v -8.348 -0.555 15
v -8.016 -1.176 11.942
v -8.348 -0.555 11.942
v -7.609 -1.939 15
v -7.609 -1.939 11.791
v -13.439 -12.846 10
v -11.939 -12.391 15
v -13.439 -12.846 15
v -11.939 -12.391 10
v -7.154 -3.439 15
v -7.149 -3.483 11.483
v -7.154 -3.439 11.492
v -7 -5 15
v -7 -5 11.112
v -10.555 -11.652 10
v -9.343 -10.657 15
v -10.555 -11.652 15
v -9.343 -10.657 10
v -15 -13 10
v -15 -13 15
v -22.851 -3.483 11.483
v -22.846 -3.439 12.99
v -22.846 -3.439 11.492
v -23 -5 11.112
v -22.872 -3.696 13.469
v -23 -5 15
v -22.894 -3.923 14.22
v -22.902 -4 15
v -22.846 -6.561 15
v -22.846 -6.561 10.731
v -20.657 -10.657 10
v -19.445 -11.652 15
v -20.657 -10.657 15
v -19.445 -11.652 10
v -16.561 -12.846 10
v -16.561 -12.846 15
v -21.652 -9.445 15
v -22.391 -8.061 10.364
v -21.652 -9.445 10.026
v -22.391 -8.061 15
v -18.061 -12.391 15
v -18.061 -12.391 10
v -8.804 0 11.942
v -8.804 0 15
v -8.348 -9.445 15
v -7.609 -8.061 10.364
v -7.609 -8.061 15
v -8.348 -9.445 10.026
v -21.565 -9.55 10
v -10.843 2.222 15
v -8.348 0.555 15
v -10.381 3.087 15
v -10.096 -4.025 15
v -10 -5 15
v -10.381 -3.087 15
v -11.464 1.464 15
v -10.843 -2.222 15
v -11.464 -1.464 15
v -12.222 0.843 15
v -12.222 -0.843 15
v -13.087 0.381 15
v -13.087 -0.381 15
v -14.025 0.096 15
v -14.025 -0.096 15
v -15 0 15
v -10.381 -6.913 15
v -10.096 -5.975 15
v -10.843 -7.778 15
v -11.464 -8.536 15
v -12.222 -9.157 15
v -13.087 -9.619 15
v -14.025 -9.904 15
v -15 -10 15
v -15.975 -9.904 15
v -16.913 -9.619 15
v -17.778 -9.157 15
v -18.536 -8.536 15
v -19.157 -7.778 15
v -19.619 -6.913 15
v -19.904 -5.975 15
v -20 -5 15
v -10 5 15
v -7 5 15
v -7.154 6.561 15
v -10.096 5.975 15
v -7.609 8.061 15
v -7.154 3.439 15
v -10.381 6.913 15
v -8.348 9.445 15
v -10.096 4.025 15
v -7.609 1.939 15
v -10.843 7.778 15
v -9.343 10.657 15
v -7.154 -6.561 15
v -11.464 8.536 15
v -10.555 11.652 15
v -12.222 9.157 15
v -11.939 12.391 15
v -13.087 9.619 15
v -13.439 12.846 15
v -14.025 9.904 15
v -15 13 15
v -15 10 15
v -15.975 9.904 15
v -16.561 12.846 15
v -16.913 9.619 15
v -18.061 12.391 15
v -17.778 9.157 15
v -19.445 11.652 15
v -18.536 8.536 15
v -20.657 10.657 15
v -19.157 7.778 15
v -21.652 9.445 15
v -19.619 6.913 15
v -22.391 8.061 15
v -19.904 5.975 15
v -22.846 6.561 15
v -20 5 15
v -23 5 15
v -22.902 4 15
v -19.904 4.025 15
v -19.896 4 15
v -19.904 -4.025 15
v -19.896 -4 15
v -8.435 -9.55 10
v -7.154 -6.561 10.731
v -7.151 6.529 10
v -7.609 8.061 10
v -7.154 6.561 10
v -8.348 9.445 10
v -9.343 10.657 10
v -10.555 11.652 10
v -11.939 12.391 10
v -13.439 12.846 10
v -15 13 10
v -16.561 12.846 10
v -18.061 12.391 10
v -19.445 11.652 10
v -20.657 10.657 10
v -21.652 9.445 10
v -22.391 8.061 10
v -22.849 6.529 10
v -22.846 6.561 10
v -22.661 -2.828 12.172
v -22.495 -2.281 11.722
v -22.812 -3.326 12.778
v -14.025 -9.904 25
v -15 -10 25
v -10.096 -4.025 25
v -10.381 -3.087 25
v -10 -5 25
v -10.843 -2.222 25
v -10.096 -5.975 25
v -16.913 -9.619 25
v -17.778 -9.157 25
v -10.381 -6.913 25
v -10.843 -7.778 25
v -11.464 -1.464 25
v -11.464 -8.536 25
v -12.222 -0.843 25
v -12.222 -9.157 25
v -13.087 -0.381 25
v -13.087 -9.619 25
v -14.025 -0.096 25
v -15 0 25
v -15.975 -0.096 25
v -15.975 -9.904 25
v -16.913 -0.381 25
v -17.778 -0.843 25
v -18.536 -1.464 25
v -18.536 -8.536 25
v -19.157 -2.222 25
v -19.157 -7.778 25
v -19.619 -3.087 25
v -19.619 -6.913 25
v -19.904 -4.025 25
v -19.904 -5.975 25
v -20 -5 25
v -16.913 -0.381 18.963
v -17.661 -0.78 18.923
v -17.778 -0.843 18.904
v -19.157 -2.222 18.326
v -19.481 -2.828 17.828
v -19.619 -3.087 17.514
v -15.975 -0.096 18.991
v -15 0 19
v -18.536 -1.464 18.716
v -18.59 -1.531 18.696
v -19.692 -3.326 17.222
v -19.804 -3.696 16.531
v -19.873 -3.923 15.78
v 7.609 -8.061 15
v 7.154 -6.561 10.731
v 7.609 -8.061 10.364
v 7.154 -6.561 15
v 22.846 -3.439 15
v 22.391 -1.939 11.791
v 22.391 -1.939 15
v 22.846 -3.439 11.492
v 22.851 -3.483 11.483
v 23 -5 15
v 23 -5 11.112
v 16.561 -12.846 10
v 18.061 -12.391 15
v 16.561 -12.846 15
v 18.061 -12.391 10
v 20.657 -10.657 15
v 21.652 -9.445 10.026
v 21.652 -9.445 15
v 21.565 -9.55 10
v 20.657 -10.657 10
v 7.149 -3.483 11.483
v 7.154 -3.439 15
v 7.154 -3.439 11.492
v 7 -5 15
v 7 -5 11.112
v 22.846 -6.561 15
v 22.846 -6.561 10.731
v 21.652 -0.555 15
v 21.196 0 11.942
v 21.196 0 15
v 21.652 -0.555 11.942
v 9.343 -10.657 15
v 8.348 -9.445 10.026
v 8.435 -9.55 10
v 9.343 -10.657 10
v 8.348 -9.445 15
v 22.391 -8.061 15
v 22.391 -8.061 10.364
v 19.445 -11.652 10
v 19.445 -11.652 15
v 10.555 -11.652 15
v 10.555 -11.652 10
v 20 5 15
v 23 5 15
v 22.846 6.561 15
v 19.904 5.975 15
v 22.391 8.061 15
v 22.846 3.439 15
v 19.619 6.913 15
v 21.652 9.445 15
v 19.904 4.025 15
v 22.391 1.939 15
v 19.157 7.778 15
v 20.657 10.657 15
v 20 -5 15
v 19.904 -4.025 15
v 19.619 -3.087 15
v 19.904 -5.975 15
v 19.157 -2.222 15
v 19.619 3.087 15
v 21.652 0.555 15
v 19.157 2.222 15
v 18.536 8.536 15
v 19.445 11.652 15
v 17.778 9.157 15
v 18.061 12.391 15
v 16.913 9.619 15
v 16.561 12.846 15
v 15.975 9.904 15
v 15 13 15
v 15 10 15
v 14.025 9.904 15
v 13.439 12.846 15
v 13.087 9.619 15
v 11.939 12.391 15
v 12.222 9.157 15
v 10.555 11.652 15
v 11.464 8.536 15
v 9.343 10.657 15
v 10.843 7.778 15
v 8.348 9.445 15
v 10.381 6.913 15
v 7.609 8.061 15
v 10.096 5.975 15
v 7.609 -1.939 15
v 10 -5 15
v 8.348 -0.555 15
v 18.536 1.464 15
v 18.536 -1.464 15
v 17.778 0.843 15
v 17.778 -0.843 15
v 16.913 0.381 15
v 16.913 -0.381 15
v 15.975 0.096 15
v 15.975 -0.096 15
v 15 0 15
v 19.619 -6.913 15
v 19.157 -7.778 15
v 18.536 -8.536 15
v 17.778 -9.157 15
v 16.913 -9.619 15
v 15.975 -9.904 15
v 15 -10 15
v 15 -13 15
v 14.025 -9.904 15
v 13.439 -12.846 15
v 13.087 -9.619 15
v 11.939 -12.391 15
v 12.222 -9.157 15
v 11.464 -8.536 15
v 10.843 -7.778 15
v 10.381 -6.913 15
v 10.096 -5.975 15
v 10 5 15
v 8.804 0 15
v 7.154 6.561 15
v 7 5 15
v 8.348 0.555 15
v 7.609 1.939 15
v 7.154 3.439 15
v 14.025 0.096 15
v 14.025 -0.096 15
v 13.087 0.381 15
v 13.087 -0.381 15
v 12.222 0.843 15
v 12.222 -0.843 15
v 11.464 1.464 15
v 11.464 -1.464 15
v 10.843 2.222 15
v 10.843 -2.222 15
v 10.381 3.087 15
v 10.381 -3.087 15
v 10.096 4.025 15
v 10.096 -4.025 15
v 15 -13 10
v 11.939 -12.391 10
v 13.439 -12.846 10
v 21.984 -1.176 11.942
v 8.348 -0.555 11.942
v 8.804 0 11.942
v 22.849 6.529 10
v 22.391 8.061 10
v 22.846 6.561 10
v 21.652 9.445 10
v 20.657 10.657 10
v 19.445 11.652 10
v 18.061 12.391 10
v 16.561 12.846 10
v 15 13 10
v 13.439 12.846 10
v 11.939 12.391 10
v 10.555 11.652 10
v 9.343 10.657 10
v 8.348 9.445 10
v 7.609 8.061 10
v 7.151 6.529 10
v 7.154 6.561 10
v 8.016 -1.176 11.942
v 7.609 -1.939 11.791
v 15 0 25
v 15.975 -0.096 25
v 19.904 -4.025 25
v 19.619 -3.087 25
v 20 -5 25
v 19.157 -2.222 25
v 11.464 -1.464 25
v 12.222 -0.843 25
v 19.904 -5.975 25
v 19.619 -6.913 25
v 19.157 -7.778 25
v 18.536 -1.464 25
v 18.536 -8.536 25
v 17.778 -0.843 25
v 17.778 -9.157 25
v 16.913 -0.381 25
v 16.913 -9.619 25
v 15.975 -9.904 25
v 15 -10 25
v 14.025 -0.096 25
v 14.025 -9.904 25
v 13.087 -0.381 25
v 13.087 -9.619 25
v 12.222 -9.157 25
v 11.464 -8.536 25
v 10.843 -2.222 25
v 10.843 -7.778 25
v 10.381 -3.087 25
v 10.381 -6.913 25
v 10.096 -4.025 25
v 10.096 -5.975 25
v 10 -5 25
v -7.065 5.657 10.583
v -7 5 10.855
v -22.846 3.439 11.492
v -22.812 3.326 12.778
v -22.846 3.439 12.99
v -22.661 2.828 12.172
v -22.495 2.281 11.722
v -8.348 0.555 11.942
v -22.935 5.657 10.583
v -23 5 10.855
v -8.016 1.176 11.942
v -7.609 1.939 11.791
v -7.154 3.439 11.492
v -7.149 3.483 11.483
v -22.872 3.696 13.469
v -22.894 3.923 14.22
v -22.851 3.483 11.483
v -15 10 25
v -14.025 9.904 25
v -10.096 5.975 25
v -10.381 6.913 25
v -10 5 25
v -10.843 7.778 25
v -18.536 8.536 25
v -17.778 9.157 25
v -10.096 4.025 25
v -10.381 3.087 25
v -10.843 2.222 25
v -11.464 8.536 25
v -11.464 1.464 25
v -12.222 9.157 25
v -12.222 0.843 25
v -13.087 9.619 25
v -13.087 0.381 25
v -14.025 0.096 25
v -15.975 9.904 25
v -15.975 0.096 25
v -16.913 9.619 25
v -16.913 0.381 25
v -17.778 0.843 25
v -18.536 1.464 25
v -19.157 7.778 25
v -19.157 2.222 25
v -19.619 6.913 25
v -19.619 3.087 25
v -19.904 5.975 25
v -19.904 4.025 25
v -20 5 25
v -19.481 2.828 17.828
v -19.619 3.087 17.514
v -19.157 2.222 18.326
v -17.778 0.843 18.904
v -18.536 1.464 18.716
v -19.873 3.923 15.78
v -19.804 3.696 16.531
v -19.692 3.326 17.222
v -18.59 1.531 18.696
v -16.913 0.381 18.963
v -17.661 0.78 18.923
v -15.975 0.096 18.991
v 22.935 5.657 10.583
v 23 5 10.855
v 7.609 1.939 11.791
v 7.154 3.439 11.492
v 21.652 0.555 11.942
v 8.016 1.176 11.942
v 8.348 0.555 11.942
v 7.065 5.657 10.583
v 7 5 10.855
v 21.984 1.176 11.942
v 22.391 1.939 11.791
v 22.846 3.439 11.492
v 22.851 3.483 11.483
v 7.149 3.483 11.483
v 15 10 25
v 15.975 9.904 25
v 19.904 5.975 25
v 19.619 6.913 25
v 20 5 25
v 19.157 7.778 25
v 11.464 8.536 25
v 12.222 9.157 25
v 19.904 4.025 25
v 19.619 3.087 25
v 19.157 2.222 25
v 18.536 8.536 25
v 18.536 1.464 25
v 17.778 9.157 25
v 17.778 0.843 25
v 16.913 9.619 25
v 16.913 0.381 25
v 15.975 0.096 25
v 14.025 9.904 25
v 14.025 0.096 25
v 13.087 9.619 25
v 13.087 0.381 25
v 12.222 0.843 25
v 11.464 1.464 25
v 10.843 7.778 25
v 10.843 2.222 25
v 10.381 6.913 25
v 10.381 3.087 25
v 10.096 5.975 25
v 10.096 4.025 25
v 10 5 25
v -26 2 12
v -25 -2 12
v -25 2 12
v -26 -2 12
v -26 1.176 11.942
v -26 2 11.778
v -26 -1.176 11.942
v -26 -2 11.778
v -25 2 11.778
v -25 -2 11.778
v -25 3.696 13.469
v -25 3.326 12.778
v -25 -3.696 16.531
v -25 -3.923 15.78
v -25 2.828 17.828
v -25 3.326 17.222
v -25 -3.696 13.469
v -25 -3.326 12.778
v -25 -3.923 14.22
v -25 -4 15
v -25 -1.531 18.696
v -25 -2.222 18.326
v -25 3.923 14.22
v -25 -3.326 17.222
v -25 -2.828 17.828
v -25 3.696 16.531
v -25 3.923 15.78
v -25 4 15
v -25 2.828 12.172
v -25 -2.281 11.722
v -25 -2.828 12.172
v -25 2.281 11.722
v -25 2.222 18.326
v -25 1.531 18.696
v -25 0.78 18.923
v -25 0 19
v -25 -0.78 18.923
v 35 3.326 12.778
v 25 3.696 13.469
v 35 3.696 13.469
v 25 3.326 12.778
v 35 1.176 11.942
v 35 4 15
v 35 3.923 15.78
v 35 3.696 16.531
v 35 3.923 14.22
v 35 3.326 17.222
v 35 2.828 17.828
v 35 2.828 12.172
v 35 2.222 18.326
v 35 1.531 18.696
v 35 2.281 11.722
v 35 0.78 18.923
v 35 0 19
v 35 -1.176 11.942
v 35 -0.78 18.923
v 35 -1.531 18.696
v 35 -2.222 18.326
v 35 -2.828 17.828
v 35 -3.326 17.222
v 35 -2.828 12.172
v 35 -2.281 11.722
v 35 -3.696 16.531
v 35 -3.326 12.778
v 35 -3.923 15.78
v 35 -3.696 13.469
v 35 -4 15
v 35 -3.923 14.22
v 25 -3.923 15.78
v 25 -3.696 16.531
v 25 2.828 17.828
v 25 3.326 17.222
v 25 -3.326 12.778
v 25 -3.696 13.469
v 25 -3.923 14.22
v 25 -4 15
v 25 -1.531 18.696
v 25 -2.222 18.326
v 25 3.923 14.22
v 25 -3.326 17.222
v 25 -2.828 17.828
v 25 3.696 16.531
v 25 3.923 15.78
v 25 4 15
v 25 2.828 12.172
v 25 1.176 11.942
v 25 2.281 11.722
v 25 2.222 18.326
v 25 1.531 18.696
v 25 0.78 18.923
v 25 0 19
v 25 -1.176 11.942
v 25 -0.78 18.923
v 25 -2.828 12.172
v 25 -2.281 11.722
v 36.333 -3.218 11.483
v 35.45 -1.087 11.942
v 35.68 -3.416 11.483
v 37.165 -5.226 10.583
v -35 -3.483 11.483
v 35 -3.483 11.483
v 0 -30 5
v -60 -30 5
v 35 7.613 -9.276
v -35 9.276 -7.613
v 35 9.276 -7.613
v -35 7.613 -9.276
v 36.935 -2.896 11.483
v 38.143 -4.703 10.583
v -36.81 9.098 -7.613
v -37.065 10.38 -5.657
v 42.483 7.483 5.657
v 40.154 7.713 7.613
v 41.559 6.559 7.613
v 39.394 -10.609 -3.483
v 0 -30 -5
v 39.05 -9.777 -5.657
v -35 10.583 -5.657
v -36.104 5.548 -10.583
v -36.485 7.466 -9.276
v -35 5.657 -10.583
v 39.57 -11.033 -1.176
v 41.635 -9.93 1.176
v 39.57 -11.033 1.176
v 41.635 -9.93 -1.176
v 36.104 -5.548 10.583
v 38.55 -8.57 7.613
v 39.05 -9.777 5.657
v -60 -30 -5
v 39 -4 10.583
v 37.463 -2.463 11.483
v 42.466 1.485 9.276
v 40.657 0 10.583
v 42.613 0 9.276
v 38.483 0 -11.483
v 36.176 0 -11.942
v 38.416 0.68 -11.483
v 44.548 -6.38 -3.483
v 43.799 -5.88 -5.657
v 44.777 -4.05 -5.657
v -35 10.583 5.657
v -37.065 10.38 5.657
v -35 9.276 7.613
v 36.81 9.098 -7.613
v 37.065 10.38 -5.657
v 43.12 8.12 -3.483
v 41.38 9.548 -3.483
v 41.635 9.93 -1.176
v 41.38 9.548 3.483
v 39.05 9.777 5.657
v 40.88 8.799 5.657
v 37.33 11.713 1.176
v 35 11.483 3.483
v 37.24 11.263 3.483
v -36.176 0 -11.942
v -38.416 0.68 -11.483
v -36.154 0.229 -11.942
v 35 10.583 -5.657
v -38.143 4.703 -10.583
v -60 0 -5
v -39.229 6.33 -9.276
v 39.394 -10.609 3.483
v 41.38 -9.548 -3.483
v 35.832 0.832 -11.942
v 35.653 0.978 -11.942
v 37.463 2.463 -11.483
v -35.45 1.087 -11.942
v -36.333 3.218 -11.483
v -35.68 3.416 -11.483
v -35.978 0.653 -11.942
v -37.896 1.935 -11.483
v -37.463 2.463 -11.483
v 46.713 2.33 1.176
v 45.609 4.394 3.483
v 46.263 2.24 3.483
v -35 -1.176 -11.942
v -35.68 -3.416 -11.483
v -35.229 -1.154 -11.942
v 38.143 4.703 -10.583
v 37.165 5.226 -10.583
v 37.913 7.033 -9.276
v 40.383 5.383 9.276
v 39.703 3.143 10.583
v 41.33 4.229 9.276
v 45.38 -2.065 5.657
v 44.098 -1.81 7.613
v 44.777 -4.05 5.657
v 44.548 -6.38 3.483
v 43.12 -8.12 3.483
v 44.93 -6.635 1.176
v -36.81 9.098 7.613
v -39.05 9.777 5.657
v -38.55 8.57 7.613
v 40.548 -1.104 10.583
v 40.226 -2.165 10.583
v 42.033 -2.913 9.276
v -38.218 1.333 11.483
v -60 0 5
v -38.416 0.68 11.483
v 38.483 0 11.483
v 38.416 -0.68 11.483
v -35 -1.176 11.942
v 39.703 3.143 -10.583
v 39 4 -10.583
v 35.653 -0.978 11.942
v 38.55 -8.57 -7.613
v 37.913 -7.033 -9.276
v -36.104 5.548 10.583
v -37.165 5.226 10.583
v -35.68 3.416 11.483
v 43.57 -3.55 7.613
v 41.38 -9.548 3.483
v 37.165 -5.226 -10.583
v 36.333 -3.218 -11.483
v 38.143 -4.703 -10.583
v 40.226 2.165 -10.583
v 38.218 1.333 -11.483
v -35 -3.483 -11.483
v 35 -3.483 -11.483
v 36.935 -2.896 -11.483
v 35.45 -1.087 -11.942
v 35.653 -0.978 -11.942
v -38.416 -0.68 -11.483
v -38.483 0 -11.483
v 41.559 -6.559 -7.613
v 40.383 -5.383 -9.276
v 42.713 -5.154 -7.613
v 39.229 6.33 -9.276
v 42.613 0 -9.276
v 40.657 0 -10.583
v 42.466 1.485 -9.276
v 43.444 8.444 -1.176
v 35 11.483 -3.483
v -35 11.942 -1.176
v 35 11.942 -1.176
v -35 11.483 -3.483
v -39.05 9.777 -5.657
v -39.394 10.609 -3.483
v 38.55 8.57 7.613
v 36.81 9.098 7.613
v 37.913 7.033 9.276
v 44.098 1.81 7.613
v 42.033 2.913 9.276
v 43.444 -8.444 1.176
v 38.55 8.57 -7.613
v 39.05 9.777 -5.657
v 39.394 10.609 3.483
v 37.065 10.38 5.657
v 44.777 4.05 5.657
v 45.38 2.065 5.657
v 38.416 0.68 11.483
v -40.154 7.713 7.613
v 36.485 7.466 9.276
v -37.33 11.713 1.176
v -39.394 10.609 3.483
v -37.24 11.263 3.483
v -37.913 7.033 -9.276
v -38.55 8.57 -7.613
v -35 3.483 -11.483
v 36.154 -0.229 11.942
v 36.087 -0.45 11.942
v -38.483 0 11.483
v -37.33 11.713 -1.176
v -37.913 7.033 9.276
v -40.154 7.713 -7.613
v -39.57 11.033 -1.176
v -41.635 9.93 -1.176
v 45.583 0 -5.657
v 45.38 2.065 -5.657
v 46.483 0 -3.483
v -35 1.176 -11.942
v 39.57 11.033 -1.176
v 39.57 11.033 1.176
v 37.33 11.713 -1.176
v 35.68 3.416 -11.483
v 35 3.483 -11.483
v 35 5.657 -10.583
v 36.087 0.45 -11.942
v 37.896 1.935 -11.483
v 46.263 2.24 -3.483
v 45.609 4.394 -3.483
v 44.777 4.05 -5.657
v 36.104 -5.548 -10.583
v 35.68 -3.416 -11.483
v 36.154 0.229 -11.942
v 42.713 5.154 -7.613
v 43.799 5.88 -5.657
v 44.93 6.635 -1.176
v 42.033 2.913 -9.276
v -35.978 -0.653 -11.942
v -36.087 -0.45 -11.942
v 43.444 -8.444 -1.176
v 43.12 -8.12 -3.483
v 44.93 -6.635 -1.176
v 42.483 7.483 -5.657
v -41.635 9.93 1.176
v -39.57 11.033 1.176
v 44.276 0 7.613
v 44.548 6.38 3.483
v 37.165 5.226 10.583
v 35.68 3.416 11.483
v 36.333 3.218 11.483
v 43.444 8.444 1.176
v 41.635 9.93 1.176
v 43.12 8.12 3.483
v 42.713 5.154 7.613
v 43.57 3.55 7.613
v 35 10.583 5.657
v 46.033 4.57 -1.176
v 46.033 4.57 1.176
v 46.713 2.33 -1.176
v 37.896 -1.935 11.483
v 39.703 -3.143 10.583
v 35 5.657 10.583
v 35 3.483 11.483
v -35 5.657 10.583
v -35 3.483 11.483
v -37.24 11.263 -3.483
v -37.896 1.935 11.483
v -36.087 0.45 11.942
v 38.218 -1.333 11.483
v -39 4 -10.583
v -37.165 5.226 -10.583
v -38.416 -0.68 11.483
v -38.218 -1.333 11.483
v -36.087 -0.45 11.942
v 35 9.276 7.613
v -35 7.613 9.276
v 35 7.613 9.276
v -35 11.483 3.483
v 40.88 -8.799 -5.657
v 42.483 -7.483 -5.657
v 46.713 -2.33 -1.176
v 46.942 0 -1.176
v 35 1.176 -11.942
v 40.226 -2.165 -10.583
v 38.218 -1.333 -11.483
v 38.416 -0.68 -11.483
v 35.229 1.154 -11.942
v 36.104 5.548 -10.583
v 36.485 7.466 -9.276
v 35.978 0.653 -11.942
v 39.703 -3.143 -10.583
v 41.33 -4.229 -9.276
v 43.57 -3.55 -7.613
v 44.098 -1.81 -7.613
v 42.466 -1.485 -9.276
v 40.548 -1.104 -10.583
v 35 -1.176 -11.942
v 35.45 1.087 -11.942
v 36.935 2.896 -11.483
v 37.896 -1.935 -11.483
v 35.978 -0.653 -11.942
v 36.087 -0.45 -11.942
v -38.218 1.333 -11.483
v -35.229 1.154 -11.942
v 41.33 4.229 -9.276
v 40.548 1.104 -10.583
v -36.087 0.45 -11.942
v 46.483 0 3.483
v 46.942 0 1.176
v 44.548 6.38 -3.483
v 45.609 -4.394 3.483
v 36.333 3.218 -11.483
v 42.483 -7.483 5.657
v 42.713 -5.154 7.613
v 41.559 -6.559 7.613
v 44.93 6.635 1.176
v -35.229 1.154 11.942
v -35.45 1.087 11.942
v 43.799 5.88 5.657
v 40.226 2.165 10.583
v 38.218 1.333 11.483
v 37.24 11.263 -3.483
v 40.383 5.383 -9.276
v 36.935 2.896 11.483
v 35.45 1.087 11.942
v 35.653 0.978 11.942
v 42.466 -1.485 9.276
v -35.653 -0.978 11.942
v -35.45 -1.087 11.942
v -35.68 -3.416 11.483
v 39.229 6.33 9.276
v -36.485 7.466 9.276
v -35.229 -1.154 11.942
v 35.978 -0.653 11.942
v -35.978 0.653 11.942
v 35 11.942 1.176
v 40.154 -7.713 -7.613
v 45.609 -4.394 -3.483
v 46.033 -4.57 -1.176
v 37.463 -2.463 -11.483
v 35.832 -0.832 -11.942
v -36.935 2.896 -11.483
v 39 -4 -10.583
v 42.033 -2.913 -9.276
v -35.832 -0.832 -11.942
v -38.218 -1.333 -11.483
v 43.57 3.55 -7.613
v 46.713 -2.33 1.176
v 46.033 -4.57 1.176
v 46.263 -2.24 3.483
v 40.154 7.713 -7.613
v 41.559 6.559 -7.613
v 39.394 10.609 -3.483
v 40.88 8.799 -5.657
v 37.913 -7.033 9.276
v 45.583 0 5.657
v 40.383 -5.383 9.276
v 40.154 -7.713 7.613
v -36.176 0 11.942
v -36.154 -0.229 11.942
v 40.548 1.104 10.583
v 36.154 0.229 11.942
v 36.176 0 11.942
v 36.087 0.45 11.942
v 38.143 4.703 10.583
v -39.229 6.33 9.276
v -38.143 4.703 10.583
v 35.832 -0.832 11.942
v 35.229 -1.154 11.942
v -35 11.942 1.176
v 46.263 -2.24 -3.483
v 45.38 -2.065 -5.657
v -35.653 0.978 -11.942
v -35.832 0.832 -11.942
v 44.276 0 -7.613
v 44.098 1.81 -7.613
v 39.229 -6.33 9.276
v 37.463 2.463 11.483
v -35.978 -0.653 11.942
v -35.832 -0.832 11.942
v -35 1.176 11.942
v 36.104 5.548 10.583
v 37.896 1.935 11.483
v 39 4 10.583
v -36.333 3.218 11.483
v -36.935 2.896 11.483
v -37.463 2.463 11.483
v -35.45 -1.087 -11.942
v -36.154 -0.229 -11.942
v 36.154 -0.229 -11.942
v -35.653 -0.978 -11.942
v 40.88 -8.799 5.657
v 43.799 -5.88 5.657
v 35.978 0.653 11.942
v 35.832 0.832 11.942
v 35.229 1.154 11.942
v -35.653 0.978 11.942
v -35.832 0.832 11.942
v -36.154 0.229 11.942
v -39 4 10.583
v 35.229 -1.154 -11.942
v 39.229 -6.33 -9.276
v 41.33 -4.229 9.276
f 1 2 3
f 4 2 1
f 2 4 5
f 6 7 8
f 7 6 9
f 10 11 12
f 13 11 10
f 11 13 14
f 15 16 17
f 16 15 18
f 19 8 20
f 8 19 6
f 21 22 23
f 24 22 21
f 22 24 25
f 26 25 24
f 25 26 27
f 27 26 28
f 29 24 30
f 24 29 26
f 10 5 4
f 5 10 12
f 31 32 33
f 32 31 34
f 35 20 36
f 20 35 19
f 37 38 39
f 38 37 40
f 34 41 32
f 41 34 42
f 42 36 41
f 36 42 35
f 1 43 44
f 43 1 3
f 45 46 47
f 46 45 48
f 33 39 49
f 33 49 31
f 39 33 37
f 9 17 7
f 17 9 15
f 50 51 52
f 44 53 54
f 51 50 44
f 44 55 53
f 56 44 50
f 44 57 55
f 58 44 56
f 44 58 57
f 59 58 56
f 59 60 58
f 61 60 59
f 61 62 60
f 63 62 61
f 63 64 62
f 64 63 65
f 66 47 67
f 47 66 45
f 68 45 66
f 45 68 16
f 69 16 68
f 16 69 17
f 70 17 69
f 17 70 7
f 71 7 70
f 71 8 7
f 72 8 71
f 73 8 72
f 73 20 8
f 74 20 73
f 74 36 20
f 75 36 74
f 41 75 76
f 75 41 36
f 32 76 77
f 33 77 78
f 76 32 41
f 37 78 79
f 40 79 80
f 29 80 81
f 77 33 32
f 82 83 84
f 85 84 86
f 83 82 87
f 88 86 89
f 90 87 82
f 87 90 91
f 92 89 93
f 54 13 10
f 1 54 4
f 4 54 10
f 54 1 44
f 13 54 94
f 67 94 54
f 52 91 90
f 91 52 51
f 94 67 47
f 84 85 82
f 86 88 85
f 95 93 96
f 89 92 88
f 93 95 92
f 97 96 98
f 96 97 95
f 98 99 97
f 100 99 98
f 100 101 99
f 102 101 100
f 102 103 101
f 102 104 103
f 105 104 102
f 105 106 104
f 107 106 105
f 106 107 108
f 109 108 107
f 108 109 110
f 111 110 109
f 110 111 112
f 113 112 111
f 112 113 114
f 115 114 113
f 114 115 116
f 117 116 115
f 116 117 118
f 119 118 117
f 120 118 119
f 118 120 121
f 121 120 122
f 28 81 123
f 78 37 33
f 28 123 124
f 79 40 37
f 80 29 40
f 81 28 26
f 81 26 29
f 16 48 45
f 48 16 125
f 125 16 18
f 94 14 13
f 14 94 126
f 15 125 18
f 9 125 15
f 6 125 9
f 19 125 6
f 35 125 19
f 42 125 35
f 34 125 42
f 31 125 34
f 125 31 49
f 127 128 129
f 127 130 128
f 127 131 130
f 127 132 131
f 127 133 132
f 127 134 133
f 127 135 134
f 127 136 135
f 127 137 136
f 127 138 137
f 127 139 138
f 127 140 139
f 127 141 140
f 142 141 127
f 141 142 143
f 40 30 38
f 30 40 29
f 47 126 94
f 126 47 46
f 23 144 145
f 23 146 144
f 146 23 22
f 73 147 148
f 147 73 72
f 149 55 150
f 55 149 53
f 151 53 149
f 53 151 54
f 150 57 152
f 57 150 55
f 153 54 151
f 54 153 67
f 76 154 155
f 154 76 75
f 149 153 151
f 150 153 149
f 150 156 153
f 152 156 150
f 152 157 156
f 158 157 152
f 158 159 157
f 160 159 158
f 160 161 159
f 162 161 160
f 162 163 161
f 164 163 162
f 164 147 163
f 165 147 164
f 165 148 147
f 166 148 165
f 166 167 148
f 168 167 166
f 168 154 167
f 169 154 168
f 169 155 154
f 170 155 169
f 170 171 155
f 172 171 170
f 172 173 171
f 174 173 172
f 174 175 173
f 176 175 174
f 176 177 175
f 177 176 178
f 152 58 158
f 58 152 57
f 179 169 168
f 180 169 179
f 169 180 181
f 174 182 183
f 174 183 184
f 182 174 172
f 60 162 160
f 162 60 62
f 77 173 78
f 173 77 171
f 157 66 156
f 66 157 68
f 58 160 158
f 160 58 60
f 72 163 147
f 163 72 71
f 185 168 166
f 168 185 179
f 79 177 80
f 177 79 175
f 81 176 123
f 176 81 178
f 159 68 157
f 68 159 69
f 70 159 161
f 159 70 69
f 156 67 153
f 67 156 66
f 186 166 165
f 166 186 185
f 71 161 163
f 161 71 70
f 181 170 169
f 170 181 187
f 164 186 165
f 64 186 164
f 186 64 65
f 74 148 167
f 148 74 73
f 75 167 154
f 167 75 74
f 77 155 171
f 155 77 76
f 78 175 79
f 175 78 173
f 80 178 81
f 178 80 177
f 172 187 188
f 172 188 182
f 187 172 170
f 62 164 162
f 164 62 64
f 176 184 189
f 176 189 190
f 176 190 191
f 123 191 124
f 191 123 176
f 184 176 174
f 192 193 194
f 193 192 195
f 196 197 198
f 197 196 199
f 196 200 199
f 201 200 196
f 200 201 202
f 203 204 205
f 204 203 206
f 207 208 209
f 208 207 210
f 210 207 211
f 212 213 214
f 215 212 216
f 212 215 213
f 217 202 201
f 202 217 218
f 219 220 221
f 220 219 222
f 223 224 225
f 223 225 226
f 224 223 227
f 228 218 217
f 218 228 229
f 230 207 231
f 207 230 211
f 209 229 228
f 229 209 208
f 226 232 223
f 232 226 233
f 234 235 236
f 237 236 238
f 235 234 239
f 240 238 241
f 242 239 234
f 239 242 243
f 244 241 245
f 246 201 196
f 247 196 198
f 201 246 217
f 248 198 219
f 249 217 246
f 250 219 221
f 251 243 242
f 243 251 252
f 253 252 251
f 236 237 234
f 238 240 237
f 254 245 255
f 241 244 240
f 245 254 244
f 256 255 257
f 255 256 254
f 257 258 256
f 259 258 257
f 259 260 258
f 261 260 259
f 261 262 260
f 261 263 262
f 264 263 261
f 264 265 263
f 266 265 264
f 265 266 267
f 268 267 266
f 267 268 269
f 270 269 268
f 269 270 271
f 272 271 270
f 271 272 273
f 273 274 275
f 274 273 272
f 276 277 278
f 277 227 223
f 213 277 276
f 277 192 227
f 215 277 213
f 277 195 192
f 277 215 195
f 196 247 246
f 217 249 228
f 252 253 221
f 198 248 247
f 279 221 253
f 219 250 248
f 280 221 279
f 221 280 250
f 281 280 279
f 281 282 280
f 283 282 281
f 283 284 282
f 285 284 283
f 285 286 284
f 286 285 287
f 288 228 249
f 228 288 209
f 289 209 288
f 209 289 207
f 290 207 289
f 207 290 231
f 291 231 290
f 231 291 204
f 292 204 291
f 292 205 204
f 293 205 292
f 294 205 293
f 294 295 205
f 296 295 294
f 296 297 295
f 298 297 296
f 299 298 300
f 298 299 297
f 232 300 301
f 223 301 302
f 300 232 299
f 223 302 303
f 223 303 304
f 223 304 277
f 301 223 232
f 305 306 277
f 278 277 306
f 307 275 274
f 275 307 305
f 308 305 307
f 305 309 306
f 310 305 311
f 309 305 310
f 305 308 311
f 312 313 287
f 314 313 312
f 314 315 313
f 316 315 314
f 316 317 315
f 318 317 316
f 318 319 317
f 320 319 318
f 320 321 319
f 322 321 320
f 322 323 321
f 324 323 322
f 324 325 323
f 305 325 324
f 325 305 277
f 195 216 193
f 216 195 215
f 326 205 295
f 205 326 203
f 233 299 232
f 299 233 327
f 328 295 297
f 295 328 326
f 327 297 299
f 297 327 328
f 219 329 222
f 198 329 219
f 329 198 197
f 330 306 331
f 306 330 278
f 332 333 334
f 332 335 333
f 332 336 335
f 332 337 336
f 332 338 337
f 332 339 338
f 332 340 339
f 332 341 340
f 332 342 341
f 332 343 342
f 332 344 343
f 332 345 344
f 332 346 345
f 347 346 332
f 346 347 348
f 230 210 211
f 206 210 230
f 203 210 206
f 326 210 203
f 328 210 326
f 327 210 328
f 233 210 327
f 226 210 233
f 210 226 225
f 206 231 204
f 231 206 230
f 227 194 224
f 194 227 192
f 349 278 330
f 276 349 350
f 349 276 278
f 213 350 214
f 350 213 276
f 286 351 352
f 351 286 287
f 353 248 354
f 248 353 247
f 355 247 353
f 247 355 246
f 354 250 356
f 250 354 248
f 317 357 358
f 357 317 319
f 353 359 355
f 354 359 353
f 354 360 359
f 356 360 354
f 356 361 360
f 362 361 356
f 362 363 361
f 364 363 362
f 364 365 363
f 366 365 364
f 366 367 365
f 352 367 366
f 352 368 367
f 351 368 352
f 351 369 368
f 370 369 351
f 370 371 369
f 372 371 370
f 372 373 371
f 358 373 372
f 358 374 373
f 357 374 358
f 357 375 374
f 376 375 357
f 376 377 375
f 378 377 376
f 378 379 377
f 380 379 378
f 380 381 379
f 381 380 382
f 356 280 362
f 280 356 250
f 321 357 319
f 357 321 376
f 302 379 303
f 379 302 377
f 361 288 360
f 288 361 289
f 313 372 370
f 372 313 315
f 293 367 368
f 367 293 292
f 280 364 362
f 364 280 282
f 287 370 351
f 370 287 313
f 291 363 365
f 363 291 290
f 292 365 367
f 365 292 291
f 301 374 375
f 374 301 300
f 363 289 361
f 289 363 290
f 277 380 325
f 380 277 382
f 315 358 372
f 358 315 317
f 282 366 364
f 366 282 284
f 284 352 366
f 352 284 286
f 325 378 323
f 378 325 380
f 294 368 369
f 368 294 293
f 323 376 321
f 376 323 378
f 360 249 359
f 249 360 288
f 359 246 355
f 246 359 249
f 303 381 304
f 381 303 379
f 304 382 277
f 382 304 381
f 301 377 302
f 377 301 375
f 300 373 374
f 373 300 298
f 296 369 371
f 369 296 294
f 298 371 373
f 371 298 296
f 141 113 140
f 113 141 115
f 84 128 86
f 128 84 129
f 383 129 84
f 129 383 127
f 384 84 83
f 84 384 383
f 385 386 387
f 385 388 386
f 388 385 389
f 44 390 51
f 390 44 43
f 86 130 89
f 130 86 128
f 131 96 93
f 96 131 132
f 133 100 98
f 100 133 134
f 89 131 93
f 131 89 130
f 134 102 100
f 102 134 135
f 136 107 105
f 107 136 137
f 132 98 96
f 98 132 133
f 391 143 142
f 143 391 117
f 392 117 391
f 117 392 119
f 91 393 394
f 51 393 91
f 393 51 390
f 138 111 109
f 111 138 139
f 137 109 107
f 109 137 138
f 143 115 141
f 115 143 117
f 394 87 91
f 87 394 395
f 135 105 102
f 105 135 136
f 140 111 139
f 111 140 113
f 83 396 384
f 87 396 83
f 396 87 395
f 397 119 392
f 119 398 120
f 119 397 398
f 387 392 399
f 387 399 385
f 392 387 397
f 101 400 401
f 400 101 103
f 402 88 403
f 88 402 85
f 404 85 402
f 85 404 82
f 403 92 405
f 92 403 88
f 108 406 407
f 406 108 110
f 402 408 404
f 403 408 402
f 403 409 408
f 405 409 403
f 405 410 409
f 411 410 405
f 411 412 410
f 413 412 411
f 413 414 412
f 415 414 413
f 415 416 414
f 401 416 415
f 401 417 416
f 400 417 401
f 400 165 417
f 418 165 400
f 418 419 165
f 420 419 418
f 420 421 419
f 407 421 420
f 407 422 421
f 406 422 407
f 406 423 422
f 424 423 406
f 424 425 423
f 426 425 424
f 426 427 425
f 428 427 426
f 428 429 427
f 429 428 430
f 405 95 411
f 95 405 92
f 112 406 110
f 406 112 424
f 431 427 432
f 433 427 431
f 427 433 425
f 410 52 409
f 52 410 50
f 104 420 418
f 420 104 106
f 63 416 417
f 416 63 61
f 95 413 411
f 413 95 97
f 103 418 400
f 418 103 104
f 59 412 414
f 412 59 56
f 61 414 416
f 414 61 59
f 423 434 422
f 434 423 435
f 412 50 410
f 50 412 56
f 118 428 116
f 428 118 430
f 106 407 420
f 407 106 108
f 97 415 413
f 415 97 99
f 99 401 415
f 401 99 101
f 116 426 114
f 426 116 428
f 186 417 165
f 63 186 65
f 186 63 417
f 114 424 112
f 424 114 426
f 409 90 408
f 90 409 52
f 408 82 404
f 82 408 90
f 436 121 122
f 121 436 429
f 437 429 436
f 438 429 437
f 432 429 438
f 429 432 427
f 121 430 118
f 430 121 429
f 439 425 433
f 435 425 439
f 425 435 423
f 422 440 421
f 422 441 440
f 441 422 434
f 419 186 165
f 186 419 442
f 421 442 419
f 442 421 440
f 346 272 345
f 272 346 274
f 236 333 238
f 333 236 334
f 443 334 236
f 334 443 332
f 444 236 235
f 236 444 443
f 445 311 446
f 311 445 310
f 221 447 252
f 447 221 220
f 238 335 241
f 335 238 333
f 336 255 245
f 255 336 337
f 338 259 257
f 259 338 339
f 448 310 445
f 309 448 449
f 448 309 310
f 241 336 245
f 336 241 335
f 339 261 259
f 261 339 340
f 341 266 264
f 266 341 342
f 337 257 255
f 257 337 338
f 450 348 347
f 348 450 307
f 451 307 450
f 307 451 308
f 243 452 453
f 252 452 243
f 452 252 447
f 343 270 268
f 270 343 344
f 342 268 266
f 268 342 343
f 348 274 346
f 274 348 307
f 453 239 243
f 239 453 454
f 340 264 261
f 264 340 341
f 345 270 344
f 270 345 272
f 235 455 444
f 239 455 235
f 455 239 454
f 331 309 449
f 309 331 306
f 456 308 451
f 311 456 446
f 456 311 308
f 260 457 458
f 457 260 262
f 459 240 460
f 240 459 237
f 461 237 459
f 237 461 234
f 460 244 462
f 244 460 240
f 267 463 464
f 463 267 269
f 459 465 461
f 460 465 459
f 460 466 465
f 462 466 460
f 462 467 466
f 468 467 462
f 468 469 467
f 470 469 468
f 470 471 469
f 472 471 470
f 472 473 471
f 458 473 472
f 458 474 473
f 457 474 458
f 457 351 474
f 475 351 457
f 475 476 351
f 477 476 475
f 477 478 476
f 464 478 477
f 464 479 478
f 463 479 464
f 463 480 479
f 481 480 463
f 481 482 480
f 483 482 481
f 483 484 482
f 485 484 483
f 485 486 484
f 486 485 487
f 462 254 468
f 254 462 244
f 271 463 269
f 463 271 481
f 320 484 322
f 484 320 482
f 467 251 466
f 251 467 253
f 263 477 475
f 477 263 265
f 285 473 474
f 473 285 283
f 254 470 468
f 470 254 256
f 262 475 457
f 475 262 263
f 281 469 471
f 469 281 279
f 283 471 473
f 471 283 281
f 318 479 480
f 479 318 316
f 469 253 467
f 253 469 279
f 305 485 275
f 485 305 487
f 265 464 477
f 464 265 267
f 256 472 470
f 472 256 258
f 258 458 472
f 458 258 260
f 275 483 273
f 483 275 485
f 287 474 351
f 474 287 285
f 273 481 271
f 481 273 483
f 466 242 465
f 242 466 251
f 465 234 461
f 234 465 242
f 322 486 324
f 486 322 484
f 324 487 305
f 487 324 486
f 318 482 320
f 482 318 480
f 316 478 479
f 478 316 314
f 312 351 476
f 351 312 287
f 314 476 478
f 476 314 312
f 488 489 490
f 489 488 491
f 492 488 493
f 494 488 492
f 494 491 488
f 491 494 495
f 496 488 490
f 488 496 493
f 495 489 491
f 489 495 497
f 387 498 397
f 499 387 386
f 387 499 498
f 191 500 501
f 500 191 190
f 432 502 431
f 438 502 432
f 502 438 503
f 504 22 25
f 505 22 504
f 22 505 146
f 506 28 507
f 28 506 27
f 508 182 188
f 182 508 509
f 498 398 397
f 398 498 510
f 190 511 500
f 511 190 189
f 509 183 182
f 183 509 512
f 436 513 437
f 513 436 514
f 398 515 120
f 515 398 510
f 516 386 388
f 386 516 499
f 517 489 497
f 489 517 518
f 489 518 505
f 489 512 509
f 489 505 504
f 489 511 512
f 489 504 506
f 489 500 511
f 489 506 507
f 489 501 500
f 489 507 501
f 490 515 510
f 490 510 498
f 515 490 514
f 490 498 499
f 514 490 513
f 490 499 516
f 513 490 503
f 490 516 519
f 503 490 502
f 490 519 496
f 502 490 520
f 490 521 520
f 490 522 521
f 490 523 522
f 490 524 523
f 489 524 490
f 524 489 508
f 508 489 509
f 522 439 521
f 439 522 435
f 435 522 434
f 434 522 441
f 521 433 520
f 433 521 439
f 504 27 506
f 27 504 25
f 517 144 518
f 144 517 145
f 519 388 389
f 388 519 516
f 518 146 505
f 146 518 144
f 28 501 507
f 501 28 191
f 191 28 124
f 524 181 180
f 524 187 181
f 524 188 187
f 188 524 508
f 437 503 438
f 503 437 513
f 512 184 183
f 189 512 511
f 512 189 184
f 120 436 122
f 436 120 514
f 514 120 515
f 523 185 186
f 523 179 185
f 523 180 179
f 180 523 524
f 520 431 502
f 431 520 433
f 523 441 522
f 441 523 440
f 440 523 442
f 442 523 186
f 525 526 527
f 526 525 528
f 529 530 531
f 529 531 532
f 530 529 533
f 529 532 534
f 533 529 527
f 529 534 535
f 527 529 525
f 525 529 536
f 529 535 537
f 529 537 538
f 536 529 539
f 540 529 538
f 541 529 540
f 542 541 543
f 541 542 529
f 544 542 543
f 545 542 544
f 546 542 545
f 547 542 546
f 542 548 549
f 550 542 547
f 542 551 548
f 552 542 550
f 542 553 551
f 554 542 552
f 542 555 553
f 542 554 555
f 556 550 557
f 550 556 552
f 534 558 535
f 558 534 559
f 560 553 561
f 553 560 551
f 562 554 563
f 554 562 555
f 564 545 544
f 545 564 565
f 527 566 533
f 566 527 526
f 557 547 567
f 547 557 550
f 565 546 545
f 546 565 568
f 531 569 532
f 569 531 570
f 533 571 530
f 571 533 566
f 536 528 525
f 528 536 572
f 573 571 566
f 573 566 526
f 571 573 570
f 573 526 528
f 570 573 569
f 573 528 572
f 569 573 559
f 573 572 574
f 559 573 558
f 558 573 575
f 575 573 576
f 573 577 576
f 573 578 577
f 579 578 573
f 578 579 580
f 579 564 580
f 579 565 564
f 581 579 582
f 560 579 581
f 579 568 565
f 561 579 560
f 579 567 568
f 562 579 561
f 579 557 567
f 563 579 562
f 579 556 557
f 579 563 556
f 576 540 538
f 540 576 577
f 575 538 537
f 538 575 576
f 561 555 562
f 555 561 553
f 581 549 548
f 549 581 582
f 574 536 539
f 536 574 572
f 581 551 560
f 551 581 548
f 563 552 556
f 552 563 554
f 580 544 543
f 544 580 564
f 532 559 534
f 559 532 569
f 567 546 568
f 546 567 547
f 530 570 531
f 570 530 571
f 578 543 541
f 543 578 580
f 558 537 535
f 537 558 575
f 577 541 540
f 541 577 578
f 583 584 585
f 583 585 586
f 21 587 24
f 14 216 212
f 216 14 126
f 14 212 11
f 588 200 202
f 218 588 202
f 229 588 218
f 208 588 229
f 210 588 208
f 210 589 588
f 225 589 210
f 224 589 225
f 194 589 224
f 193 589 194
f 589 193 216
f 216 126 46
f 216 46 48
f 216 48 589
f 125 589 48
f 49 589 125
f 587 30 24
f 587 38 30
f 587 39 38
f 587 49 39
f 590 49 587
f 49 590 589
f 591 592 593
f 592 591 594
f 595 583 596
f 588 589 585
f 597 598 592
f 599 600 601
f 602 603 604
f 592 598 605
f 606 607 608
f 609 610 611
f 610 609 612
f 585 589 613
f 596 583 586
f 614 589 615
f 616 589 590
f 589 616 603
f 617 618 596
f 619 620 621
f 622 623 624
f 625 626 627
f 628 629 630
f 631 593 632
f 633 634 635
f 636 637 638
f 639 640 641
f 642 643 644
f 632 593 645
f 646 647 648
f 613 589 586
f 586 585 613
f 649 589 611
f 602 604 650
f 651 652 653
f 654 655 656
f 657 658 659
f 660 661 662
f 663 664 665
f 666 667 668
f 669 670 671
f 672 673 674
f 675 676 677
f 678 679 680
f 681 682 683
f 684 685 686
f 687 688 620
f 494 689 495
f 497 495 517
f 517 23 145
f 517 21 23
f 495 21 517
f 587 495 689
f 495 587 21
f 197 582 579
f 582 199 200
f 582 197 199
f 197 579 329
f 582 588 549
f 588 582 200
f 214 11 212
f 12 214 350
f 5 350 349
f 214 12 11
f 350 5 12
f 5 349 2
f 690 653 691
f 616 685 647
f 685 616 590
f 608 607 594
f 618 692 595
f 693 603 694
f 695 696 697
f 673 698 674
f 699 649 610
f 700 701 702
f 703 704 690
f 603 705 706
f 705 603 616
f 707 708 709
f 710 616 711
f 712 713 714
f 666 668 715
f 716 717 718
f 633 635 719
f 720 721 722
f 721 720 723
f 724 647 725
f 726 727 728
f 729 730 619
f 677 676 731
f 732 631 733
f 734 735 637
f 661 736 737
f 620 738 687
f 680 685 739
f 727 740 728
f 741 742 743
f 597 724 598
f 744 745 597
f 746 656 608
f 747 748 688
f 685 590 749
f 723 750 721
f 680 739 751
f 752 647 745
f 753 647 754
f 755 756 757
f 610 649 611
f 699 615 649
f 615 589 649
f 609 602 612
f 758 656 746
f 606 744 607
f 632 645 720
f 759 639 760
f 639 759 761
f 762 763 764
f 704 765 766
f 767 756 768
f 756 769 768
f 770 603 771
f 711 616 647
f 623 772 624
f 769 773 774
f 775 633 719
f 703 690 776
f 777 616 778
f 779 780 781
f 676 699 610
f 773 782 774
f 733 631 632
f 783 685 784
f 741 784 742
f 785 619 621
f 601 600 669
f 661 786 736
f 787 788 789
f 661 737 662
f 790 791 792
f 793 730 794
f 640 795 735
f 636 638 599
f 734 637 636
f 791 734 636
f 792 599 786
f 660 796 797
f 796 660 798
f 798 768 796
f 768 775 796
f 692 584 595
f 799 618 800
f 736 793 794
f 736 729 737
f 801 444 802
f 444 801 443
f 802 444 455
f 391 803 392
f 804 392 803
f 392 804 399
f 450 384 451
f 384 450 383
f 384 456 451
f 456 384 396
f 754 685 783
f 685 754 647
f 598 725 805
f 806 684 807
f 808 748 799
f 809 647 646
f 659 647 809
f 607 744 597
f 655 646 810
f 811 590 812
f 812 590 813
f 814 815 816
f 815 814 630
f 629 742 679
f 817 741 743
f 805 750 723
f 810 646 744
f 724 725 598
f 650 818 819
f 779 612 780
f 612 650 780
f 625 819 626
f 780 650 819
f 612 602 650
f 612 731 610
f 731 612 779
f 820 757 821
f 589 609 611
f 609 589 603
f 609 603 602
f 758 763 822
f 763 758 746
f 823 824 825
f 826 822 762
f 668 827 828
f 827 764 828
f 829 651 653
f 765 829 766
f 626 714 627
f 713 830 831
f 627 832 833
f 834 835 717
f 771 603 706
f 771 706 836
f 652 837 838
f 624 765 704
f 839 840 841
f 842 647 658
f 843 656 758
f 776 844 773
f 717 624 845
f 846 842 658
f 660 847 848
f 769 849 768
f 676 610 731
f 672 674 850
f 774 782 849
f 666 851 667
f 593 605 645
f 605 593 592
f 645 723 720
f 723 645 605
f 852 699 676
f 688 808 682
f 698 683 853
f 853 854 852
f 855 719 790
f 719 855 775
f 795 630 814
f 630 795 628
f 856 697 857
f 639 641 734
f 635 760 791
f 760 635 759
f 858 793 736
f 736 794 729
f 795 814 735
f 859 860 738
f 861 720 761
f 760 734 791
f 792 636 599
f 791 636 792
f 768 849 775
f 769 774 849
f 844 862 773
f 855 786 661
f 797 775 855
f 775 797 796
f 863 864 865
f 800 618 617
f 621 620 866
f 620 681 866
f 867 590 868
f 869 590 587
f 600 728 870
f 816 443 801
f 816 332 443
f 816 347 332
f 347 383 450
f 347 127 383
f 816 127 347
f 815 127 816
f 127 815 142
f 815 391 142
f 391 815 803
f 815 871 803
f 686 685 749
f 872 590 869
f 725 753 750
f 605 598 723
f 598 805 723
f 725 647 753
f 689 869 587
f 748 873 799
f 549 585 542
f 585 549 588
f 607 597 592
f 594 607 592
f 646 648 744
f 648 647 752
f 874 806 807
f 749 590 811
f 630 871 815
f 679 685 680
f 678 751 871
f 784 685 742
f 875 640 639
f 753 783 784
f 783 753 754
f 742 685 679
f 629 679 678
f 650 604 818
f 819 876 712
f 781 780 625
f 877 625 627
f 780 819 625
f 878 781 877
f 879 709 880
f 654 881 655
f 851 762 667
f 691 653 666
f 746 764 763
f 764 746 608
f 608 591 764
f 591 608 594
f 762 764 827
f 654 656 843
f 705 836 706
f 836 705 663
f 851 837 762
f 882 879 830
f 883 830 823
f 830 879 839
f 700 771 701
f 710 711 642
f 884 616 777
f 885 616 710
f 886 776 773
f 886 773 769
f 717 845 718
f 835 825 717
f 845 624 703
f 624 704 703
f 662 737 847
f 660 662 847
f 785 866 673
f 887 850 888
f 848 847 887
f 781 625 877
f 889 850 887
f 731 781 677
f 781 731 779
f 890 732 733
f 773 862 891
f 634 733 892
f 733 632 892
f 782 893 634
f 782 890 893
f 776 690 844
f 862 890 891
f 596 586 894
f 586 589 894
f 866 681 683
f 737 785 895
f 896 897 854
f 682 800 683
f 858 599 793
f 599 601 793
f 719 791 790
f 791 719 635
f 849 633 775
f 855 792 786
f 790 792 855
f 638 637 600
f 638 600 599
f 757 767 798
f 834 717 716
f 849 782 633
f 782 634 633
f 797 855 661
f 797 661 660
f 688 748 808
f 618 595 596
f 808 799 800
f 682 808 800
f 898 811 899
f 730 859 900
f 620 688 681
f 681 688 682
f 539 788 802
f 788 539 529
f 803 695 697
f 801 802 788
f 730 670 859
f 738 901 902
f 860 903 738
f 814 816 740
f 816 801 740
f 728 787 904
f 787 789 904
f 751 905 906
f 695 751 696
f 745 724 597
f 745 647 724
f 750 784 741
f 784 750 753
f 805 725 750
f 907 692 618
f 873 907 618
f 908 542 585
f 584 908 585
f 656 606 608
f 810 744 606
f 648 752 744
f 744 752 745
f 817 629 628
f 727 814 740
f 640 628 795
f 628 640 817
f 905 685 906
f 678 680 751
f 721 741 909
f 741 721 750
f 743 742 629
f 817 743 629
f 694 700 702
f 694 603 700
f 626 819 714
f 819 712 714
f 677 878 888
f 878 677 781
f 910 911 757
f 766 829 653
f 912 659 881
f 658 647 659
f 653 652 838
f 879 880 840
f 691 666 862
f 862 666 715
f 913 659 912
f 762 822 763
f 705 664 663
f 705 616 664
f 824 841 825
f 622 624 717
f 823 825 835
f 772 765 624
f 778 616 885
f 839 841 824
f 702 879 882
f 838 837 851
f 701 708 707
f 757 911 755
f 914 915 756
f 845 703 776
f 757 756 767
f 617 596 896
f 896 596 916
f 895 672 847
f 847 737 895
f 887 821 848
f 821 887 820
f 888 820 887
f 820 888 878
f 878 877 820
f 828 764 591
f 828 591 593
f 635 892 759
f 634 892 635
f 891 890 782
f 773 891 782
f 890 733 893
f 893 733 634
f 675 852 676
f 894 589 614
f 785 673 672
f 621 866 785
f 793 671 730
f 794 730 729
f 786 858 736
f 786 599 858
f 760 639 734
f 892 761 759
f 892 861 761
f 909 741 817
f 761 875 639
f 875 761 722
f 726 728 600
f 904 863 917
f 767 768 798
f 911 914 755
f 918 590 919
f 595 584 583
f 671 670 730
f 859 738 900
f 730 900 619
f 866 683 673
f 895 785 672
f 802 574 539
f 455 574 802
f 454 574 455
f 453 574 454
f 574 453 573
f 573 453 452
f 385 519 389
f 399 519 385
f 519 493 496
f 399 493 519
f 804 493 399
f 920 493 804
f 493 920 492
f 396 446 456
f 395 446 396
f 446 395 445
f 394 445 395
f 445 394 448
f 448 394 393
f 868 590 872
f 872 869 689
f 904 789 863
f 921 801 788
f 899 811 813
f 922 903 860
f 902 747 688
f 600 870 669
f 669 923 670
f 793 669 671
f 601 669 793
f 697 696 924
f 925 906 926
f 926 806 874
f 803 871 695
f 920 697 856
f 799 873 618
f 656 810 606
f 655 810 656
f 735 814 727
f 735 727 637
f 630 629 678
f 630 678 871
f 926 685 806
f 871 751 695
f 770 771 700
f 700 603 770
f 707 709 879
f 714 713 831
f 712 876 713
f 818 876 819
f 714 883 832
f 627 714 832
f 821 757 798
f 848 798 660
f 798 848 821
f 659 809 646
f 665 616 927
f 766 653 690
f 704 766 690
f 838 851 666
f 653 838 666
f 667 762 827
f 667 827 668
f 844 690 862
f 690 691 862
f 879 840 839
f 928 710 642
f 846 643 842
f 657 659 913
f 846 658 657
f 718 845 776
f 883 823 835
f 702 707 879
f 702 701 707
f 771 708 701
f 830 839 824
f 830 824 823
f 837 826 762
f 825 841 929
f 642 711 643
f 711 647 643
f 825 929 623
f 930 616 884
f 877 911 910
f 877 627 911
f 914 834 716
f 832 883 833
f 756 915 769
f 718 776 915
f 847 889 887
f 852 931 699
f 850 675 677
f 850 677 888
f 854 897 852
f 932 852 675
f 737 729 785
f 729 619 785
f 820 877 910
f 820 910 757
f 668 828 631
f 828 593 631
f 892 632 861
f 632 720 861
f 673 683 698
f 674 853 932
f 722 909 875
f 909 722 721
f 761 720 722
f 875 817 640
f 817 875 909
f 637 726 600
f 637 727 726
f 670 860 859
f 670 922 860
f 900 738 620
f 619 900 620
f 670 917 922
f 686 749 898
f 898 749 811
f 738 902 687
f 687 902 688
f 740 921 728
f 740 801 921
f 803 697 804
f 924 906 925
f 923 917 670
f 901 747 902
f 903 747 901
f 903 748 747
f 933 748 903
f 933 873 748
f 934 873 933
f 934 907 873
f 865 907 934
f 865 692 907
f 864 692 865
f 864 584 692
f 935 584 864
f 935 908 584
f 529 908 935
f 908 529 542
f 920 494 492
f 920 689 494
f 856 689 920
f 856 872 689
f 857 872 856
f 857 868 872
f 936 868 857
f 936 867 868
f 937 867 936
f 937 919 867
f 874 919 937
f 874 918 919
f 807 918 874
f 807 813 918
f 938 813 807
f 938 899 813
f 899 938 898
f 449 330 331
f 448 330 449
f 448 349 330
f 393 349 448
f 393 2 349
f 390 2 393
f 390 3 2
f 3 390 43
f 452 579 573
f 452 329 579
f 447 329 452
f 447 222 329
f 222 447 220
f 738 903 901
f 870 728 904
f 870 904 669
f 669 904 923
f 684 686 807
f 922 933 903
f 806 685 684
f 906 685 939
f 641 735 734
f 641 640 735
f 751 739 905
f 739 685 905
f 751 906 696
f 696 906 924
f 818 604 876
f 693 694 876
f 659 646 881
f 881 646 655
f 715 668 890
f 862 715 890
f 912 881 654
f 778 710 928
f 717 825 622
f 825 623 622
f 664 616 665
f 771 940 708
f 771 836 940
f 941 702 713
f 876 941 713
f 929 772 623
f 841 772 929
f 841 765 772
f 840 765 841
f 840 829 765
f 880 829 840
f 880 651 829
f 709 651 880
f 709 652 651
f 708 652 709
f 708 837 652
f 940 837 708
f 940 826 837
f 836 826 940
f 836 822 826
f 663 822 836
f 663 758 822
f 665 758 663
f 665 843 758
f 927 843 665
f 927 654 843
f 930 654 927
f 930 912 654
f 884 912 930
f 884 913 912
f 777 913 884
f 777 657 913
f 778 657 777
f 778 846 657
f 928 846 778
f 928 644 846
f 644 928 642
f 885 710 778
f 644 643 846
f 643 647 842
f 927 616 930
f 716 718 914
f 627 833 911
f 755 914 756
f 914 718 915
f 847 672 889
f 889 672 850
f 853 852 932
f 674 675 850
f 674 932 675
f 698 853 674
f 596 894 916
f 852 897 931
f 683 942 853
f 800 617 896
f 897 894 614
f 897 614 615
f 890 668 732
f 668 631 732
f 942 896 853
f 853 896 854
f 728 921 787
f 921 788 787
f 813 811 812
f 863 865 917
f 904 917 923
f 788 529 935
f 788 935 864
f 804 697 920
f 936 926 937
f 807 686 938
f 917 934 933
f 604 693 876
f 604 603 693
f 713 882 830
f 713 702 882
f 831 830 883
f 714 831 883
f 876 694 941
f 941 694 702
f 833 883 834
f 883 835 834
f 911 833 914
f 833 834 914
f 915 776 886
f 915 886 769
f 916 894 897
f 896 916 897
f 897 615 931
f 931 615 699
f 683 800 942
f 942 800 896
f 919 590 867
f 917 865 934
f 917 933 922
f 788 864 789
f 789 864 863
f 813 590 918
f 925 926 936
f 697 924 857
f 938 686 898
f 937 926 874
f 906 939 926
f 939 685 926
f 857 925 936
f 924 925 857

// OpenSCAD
$fn = 32;

// Game Controller Body
module body() {
    hull() {
        translate([-30, -15, 0]) cube([60, 30, 10], center=true);
        translate([-35, 0, 0]) sphere(r=12);
        translate([35, 0, 0]) sphere(r=12);
    }
}

// Thumbsticks
module thumbstick(x, y) {
    translate([x, y, 10]) {
        cylinder(h=5, r=8); // Base
        translate([0, 0, 5]) cylinder(h=10, r=5); // Stick
    }
}

// Shoulder Buttons (L/R)
module shoulder_buttons() {
    translate([-25, 0, 15]) rotate([0, 90, 0]) cylinder(h=10, r=4);
    translate([25, 0, 15]) rotate([0, 90, 0]) cylinder(h=10, r=4);
}

// D-Pad
module dpad() {
    translate([-20, 0, 10]) {
        cube([12, 4, 4], center=true); // Horiz
        cube([4, 12, 4], center=true); // Vert
    }
}

// Main Assembly
union() {
    body();
    thumbstick(-15, -5);
    thumbstick(15, -5);
    thumbstick(-15, 5);
    thumbstick(15, 5);
    dpad();
    shoulder_buttons();
}
